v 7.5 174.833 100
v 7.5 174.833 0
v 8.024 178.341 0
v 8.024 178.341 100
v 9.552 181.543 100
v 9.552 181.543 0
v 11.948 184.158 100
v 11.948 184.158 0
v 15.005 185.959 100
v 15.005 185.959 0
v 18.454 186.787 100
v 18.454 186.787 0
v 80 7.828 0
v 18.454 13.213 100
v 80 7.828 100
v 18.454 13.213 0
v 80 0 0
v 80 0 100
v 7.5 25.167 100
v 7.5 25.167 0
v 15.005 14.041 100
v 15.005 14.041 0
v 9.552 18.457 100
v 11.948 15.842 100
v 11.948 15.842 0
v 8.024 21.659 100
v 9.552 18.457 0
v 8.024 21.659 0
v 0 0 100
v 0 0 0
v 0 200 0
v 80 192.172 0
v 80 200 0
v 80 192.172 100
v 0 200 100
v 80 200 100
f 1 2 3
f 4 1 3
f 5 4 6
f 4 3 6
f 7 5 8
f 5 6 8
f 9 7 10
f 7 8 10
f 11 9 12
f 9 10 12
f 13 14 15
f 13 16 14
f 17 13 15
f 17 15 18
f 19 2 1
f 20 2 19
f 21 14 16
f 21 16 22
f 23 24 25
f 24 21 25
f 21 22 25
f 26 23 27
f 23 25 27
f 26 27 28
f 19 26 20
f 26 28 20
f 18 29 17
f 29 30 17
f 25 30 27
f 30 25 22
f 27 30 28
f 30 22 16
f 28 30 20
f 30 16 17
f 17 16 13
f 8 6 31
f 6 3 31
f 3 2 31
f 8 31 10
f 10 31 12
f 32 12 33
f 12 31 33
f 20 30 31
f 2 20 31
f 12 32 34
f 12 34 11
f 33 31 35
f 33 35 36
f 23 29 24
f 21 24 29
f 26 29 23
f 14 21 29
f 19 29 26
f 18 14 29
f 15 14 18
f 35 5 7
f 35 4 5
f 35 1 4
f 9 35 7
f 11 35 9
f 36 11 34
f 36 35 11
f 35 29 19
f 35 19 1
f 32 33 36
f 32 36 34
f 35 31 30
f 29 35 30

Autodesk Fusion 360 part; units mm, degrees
sketch "スケッチ1" plane through (0, 0, 0) normal (0, 0, 1) x (1, 0, 0)
  line L0 (7.5, 174.8326) -> (7.5, 25.1674)
  line L1 (0, 200) -> (0, 0)
  line L2 (0, 0) -> (80, 0)
  line L3 (80, 7.8285) -> (80, 0)
  line L4 (18.4541, 13.2131) -> (80, 7.8285)
  arc A0 (7.5, 25.1674) -> (18.4541, 13.2131) centre (19.5, 25.1674) ccw
  line L5 (80, 192.1715) -> (18.4541, 186.7869)
  line L6 (0, 200) -> (80, 200)
  arc A1 (18.4541, 186.7869) -> (7.5, 174.8326) centre (19.5, 174.8326) ccw
  line L7 (80, 200) -> (80, 192.1715)
extrude "押し出し1" add sketch "スケッチ1" along normal blind 100
